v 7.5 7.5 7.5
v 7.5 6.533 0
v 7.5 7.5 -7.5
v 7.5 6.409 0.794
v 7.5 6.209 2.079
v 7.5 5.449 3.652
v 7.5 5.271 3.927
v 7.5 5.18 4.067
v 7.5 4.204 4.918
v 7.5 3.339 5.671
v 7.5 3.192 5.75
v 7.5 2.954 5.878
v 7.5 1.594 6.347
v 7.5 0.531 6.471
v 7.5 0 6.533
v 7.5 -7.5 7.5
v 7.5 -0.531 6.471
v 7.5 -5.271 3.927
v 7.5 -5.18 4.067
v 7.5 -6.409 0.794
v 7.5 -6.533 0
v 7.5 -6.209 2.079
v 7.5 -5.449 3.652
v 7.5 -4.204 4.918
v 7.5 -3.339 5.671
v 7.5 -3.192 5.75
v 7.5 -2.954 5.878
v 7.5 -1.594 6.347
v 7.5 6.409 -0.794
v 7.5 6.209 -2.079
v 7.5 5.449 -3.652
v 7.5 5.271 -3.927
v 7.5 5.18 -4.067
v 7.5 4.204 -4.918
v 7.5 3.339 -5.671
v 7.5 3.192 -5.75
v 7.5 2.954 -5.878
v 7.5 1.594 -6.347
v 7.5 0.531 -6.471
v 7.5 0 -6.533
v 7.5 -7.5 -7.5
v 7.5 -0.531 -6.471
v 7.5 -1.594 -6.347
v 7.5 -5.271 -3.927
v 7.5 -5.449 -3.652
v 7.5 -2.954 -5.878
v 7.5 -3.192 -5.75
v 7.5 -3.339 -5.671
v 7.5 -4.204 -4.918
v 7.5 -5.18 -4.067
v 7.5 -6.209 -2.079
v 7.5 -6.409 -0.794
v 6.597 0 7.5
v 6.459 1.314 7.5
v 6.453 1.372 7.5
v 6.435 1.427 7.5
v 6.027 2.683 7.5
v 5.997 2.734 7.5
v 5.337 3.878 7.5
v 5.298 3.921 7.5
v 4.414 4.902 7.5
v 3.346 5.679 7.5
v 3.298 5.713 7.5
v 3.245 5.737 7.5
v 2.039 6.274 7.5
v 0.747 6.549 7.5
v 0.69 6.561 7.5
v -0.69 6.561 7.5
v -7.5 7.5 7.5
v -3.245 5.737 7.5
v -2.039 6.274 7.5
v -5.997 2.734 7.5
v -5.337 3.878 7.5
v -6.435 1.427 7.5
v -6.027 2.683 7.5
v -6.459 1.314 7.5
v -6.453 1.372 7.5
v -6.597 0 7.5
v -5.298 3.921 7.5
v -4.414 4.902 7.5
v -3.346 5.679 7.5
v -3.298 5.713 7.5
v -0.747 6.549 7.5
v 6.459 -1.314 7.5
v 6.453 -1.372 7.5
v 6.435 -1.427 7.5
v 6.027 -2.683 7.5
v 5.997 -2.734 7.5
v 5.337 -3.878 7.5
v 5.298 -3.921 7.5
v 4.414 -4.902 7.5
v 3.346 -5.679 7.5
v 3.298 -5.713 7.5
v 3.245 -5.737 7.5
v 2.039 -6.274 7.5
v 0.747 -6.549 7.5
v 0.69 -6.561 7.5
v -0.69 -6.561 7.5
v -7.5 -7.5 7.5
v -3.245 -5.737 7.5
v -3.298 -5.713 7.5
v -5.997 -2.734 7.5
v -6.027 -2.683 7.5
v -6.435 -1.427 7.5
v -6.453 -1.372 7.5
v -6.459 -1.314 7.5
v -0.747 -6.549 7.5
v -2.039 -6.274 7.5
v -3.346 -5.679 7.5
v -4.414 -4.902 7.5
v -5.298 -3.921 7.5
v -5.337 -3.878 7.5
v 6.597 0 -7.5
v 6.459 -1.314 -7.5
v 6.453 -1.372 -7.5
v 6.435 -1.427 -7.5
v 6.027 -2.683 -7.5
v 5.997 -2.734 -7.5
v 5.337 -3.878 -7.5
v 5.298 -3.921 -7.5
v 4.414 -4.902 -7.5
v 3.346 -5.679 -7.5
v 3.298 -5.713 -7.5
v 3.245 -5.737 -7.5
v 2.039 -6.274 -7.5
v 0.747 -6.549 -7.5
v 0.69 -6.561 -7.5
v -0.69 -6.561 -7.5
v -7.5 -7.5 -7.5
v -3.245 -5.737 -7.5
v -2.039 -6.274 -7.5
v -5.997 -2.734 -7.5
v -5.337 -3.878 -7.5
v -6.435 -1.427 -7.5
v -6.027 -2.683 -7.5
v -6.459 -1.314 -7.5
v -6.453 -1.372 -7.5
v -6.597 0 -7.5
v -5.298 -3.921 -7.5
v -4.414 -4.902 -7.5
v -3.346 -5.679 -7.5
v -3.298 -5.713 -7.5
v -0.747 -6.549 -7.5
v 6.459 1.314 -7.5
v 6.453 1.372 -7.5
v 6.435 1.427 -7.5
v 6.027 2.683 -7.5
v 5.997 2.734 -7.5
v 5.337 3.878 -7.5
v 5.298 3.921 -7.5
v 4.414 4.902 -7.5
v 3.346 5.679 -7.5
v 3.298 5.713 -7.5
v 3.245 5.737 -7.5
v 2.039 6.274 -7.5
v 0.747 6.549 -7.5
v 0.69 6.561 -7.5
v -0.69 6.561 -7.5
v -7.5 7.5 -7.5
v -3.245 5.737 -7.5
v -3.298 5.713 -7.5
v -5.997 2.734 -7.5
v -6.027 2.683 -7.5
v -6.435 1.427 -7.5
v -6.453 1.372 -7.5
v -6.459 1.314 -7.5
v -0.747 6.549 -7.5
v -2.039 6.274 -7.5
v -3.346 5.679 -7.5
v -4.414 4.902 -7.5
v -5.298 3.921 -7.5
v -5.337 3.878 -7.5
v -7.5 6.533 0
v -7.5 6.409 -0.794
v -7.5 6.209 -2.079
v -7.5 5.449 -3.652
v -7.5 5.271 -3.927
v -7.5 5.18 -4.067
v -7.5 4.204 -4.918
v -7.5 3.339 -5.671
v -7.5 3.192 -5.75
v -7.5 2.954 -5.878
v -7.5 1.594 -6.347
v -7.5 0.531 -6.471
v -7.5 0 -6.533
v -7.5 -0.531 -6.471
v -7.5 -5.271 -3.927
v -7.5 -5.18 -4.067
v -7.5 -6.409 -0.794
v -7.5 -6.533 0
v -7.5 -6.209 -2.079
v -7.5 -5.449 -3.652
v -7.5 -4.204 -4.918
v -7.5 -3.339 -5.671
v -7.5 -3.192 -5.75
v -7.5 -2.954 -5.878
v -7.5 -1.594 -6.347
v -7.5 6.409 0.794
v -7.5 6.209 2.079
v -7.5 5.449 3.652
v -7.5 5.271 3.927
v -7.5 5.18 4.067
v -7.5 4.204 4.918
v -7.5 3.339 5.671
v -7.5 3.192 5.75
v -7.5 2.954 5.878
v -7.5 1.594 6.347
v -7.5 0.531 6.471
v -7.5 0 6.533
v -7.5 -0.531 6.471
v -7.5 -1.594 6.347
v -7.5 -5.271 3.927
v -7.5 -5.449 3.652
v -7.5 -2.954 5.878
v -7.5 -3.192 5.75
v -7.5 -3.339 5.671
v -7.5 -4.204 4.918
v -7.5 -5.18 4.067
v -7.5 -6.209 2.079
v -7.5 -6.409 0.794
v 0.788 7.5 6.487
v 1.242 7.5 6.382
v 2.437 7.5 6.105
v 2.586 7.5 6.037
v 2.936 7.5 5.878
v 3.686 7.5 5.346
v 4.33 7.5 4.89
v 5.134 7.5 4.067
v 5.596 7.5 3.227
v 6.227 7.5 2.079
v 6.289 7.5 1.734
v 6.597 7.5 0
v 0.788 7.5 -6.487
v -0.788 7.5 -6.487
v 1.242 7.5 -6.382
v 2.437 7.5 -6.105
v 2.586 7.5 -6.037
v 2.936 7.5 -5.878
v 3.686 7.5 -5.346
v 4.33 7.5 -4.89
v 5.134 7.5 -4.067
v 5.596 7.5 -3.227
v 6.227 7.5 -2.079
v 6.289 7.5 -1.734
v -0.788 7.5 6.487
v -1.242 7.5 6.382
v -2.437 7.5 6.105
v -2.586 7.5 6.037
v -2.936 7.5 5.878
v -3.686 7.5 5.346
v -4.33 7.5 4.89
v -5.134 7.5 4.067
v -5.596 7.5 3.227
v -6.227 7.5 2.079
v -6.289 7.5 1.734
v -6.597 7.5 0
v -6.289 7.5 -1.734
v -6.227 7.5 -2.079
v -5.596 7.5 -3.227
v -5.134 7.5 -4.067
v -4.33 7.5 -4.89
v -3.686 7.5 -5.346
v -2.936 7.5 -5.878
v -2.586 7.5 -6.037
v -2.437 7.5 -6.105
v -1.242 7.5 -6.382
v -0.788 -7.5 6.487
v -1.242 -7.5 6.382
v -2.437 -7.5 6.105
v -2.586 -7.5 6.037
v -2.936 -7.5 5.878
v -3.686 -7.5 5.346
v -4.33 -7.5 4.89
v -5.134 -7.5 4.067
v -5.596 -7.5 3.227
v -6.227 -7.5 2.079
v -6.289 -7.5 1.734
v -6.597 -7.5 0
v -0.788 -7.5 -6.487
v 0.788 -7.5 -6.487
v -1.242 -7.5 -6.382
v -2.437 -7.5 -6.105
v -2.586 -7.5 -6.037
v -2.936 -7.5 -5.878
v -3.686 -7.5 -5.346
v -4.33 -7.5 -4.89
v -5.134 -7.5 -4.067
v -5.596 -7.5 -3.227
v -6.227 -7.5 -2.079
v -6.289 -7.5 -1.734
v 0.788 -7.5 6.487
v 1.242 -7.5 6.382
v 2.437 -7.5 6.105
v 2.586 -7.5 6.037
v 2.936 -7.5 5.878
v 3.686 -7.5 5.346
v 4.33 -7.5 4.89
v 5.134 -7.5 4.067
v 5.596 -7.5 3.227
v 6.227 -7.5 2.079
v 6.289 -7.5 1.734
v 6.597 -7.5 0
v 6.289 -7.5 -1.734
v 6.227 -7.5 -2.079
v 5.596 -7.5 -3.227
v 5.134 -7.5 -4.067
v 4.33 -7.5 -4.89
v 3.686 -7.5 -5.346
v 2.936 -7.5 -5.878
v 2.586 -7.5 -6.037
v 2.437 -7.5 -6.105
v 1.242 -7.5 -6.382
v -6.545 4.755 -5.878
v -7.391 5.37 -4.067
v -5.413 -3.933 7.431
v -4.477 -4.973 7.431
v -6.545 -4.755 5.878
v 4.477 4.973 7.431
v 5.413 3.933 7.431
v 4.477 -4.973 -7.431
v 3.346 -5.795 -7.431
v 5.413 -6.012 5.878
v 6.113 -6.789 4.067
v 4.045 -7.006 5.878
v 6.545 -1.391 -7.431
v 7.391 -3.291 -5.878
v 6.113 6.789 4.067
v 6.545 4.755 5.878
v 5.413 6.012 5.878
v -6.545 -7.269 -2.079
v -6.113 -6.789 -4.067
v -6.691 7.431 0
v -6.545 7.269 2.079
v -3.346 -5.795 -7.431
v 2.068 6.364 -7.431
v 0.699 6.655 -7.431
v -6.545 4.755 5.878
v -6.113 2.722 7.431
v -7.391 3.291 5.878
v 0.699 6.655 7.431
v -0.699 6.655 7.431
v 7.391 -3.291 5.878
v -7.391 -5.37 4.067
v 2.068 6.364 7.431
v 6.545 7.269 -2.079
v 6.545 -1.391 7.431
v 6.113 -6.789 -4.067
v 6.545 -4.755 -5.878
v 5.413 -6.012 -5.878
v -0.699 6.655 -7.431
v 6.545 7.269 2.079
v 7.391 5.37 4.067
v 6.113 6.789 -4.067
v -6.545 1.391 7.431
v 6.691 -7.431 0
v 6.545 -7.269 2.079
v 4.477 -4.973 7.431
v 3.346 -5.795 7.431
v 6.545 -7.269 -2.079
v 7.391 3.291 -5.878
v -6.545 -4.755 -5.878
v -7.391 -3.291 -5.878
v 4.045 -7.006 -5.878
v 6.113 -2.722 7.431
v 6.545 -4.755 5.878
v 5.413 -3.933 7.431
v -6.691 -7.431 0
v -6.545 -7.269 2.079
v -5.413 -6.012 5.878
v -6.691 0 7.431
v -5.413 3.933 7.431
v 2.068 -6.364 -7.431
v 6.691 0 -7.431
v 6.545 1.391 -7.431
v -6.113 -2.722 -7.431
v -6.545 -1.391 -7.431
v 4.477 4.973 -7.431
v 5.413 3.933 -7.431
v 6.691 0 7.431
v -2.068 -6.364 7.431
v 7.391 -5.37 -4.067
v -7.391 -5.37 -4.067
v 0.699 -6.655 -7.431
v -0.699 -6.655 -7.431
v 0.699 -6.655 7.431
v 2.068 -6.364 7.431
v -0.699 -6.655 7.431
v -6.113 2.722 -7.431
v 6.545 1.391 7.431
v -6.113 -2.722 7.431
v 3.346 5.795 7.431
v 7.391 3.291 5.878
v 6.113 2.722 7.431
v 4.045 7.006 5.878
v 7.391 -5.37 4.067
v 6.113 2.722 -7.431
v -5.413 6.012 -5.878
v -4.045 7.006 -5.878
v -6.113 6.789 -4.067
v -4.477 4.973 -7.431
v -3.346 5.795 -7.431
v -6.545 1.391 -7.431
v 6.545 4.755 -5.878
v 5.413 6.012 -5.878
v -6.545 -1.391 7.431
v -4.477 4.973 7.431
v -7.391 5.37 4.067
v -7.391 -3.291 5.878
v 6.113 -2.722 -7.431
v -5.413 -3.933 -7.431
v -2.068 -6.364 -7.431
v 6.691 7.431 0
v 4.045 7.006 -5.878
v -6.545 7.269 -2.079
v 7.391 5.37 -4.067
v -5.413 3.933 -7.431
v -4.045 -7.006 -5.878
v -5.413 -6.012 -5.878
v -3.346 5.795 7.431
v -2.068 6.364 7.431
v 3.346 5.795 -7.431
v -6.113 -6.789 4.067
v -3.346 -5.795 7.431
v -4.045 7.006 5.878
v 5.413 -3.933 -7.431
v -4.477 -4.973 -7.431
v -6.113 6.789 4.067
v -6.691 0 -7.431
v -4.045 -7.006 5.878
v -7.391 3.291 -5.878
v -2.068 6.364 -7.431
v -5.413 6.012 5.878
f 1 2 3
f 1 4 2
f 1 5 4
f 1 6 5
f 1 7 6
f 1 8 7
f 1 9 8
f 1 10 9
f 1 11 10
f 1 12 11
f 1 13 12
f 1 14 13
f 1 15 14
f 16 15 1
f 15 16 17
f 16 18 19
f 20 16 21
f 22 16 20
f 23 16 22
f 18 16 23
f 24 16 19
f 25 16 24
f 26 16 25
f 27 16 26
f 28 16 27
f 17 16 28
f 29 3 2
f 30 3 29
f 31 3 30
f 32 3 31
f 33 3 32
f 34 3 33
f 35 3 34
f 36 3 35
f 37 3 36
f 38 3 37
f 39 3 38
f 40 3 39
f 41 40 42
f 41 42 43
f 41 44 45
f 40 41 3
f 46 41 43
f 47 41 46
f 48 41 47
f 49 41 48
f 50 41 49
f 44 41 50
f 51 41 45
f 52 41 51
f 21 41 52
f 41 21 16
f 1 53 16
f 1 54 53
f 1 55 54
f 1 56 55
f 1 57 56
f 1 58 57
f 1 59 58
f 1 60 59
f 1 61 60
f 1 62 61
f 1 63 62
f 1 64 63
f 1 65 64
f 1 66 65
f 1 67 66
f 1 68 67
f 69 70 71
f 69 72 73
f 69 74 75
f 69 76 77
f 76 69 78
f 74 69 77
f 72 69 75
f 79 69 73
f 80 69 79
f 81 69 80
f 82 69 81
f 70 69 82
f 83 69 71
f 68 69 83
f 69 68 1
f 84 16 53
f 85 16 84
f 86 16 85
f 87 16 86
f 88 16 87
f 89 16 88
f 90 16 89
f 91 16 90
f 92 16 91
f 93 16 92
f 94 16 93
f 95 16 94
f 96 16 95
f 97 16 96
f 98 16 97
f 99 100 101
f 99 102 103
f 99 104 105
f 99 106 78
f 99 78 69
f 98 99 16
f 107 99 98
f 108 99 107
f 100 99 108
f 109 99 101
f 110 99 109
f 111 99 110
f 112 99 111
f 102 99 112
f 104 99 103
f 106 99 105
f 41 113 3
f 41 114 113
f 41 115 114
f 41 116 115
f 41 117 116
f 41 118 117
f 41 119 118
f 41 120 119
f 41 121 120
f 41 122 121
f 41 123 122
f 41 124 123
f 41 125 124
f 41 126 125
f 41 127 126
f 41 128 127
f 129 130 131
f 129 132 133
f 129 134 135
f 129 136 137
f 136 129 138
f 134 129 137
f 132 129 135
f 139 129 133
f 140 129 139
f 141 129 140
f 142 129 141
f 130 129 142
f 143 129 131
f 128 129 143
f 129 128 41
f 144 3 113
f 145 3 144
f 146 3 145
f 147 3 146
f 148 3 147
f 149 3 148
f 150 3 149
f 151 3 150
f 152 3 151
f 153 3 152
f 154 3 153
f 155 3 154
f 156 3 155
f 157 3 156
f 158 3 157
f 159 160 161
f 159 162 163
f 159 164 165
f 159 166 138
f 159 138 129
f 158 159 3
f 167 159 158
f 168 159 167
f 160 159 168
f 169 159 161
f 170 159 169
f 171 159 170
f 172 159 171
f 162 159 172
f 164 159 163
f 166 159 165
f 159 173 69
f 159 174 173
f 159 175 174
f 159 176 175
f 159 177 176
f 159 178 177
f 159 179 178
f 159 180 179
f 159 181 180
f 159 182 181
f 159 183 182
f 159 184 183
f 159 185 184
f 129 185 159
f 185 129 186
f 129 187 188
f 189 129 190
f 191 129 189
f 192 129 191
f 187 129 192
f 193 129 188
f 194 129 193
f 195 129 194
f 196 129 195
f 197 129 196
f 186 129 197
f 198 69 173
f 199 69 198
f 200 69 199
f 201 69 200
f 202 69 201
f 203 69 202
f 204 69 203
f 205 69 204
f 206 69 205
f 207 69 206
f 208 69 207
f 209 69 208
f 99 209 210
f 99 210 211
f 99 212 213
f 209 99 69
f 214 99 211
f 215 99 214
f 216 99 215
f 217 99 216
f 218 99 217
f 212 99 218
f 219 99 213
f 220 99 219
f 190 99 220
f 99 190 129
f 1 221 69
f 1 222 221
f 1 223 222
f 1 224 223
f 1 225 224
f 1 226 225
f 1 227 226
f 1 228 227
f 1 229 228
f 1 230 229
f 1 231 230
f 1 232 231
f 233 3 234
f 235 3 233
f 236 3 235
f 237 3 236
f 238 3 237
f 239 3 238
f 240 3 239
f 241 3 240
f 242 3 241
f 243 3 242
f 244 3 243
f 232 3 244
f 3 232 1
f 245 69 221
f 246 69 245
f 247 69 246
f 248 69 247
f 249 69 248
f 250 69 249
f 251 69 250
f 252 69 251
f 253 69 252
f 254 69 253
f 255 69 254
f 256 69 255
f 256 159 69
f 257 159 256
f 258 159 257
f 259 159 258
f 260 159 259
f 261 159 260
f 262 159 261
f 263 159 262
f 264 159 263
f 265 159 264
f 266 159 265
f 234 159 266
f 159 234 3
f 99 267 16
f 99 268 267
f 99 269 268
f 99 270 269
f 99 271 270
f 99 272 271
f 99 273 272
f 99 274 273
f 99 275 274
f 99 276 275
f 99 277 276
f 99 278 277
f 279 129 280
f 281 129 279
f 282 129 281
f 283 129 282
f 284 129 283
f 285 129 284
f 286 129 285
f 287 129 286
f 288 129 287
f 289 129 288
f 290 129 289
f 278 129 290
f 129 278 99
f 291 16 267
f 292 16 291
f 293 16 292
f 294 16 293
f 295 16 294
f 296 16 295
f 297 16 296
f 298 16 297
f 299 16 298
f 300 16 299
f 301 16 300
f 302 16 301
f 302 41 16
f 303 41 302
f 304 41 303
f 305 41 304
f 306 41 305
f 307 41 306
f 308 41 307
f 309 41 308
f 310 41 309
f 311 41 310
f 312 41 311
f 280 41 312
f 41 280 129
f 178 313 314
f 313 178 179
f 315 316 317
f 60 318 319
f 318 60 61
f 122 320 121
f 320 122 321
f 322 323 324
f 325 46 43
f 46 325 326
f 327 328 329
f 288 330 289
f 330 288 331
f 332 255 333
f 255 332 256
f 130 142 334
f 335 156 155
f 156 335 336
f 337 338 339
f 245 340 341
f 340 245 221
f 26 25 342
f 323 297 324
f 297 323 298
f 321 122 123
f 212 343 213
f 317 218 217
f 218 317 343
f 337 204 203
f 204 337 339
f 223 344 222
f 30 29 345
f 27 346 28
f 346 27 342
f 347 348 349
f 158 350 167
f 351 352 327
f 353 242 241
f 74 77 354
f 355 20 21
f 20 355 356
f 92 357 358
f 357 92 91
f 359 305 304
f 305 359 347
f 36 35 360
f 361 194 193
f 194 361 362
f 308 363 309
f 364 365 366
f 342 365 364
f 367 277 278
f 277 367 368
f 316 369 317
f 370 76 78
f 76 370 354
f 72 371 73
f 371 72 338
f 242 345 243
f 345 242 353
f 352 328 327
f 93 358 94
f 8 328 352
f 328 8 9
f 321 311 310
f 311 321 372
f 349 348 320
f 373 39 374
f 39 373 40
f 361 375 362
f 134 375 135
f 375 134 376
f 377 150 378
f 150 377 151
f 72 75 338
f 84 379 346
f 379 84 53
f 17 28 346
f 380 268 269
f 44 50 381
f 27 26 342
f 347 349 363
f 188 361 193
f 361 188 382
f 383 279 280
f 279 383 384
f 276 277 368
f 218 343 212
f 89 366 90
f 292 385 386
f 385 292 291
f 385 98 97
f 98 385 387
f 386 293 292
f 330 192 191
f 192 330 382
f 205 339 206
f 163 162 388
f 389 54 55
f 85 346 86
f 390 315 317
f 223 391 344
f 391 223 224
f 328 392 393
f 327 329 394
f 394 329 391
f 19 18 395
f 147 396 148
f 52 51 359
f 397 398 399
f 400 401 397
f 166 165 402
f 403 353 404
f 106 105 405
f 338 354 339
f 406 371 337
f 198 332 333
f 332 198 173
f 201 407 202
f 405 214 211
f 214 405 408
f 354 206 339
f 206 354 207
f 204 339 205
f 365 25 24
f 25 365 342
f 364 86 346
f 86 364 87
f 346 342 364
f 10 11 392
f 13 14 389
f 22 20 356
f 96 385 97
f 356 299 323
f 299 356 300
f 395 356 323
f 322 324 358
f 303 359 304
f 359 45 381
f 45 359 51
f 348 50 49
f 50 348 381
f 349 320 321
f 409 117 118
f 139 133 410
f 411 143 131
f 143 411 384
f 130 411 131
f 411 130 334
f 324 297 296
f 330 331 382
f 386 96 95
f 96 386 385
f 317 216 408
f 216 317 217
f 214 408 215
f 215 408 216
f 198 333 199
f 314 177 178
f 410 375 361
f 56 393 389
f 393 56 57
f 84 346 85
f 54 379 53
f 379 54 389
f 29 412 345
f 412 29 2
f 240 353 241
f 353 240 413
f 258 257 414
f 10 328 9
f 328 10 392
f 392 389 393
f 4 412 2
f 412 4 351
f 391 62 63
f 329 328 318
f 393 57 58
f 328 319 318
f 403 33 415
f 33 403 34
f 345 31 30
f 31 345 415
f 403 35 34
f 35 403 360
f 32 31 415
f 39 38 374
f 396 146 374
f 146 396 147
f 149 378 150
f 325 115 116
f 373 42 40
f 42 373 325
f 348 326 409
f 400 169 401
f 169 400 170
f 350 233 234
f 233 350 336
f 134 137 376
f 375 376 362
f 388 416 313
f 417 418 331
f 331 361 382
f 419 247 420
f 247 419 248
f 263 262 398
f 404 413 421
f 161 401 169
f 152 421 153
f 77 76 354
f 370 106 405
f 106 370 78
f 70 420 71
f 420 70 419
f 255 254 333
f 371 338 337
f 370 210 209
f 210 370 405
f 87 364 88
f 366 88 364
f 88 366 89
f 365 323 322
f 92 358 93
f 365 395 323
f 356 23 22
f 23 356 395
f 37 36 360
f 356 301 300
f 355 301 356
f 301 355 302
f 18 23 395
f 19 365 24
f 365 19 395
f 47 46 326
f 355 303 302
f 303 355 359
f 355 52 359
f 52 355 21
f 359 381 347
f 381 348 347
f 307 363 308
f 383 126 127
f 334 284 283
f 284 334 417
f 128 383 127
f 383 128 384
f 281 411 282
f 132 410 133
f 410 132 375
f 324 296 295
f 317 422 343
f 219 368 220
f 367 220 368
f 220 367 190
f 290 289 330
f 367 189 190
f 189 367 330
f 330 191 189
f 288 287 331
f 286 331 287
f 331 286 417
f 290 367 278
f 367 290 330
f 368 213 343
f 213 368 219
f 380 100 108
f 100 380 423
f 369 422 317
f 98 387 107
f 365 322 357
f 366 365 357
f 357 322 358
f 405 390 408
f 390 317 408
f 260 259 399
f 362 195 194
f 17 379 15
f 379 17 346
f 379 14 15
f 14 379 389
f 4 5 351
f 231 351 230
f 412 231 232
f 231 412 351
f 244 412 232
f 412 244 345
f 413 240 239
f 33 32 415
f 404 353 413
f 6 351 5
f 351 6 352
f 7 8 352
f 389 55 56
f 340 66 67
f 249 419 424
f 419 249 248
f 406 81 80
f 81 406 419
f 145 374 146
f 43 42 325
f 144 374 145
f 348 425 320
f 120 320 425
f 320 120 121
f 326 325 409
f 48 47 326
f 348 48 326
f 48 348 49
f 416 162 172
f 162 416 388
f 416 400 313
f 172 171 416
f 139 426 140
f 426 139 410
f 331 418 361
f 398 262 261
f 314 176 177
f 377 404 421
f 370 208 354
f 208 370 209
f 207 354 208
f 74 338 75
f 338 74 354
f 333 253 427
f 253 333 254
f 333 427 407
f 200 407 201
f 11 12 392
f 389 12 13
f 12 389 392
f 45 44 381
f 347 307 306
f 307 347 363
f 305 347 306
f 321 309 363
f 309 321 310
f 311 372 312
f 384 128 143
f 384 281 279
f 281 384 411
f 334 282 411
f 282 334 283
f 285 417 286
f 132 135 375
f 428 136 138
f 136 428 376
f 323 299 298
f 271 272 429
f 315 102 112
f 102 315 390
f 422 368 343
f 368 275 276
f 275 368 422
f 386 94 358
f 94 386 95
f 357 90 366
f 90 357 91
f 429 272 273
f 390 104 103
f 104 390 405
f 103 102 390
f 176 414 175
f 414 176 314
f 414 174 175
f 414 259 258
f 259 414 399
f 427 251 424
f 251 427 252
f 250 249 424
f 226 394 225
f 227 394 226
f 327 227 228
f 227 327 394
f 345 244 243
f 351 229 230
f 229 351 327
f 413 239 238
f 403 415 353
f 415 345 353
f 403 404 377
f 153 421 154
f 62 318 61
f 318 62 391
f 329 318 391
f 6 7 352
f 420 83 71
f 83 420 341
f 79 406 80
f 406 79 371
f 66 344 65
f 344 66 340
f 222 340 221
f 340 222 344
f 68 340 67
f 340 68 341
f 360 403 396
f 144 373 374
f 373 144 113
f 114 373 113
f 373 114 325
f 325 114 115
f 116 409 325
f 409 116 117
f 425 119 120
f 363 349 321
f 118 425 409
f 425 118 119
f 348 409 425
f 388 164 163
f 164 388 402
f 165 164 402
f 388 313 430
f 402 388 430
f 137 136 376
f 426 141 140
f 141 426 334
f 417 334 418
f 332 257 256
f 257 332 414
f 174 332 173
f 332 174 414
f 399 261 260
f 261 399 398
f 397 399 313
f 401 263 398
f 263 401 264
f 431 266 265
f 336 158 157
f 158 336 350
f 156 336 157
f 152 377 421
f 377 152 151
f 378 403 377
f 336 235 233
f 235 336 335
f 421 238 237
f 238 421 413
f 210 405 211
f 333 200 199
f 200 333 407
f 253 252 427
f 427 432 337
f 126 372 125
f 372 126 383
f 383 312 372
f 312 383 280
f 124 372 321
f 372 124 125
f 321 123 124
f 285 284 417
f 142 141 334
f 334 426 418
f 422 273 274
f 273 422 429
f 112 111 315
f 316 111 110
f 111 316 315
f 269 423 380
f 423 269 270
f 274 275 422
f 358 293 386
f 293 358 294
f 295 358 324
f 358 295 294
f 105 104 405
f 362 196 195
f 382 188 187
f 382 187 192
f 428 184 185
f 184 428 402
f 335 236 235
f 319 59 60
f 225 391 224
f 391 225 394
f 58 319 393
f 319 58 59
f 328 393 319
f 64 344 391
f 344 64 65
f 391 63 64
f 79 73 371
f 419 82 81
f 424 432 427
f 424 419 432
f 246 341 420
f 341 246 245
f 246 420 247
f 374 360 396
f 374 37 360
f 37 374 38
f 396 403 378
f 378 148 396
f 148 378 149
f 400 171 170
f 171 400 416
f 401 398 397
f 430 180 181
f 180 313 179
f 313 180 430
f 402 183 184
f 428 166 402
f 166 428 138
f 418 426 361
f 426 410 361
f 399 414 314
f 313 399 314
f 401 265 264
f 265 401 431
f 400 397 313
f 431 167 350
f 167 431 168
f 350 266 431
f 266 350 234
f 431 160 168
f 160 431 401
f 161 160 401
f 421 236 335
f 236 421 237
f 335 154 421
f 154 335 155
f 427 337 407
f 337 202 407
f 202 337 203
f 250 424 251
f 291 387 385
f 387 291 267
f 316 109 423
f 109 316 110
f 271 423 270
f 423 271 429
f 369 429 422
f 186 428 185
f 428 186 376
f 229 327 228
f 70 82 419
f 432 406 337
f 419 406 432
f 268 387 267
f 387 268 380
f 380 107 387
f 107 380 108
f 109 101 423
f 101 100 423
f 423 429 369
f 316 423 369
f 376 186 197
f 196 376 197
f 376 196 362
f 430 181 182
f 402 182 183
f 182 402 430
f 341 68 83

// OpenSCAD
// The exact-geometry audit's case c01 (docs/audits/exact-geometry-rust.md).
// volume: 266.13226988510087
difference() { cube(15, center=true); sphere(10); }
